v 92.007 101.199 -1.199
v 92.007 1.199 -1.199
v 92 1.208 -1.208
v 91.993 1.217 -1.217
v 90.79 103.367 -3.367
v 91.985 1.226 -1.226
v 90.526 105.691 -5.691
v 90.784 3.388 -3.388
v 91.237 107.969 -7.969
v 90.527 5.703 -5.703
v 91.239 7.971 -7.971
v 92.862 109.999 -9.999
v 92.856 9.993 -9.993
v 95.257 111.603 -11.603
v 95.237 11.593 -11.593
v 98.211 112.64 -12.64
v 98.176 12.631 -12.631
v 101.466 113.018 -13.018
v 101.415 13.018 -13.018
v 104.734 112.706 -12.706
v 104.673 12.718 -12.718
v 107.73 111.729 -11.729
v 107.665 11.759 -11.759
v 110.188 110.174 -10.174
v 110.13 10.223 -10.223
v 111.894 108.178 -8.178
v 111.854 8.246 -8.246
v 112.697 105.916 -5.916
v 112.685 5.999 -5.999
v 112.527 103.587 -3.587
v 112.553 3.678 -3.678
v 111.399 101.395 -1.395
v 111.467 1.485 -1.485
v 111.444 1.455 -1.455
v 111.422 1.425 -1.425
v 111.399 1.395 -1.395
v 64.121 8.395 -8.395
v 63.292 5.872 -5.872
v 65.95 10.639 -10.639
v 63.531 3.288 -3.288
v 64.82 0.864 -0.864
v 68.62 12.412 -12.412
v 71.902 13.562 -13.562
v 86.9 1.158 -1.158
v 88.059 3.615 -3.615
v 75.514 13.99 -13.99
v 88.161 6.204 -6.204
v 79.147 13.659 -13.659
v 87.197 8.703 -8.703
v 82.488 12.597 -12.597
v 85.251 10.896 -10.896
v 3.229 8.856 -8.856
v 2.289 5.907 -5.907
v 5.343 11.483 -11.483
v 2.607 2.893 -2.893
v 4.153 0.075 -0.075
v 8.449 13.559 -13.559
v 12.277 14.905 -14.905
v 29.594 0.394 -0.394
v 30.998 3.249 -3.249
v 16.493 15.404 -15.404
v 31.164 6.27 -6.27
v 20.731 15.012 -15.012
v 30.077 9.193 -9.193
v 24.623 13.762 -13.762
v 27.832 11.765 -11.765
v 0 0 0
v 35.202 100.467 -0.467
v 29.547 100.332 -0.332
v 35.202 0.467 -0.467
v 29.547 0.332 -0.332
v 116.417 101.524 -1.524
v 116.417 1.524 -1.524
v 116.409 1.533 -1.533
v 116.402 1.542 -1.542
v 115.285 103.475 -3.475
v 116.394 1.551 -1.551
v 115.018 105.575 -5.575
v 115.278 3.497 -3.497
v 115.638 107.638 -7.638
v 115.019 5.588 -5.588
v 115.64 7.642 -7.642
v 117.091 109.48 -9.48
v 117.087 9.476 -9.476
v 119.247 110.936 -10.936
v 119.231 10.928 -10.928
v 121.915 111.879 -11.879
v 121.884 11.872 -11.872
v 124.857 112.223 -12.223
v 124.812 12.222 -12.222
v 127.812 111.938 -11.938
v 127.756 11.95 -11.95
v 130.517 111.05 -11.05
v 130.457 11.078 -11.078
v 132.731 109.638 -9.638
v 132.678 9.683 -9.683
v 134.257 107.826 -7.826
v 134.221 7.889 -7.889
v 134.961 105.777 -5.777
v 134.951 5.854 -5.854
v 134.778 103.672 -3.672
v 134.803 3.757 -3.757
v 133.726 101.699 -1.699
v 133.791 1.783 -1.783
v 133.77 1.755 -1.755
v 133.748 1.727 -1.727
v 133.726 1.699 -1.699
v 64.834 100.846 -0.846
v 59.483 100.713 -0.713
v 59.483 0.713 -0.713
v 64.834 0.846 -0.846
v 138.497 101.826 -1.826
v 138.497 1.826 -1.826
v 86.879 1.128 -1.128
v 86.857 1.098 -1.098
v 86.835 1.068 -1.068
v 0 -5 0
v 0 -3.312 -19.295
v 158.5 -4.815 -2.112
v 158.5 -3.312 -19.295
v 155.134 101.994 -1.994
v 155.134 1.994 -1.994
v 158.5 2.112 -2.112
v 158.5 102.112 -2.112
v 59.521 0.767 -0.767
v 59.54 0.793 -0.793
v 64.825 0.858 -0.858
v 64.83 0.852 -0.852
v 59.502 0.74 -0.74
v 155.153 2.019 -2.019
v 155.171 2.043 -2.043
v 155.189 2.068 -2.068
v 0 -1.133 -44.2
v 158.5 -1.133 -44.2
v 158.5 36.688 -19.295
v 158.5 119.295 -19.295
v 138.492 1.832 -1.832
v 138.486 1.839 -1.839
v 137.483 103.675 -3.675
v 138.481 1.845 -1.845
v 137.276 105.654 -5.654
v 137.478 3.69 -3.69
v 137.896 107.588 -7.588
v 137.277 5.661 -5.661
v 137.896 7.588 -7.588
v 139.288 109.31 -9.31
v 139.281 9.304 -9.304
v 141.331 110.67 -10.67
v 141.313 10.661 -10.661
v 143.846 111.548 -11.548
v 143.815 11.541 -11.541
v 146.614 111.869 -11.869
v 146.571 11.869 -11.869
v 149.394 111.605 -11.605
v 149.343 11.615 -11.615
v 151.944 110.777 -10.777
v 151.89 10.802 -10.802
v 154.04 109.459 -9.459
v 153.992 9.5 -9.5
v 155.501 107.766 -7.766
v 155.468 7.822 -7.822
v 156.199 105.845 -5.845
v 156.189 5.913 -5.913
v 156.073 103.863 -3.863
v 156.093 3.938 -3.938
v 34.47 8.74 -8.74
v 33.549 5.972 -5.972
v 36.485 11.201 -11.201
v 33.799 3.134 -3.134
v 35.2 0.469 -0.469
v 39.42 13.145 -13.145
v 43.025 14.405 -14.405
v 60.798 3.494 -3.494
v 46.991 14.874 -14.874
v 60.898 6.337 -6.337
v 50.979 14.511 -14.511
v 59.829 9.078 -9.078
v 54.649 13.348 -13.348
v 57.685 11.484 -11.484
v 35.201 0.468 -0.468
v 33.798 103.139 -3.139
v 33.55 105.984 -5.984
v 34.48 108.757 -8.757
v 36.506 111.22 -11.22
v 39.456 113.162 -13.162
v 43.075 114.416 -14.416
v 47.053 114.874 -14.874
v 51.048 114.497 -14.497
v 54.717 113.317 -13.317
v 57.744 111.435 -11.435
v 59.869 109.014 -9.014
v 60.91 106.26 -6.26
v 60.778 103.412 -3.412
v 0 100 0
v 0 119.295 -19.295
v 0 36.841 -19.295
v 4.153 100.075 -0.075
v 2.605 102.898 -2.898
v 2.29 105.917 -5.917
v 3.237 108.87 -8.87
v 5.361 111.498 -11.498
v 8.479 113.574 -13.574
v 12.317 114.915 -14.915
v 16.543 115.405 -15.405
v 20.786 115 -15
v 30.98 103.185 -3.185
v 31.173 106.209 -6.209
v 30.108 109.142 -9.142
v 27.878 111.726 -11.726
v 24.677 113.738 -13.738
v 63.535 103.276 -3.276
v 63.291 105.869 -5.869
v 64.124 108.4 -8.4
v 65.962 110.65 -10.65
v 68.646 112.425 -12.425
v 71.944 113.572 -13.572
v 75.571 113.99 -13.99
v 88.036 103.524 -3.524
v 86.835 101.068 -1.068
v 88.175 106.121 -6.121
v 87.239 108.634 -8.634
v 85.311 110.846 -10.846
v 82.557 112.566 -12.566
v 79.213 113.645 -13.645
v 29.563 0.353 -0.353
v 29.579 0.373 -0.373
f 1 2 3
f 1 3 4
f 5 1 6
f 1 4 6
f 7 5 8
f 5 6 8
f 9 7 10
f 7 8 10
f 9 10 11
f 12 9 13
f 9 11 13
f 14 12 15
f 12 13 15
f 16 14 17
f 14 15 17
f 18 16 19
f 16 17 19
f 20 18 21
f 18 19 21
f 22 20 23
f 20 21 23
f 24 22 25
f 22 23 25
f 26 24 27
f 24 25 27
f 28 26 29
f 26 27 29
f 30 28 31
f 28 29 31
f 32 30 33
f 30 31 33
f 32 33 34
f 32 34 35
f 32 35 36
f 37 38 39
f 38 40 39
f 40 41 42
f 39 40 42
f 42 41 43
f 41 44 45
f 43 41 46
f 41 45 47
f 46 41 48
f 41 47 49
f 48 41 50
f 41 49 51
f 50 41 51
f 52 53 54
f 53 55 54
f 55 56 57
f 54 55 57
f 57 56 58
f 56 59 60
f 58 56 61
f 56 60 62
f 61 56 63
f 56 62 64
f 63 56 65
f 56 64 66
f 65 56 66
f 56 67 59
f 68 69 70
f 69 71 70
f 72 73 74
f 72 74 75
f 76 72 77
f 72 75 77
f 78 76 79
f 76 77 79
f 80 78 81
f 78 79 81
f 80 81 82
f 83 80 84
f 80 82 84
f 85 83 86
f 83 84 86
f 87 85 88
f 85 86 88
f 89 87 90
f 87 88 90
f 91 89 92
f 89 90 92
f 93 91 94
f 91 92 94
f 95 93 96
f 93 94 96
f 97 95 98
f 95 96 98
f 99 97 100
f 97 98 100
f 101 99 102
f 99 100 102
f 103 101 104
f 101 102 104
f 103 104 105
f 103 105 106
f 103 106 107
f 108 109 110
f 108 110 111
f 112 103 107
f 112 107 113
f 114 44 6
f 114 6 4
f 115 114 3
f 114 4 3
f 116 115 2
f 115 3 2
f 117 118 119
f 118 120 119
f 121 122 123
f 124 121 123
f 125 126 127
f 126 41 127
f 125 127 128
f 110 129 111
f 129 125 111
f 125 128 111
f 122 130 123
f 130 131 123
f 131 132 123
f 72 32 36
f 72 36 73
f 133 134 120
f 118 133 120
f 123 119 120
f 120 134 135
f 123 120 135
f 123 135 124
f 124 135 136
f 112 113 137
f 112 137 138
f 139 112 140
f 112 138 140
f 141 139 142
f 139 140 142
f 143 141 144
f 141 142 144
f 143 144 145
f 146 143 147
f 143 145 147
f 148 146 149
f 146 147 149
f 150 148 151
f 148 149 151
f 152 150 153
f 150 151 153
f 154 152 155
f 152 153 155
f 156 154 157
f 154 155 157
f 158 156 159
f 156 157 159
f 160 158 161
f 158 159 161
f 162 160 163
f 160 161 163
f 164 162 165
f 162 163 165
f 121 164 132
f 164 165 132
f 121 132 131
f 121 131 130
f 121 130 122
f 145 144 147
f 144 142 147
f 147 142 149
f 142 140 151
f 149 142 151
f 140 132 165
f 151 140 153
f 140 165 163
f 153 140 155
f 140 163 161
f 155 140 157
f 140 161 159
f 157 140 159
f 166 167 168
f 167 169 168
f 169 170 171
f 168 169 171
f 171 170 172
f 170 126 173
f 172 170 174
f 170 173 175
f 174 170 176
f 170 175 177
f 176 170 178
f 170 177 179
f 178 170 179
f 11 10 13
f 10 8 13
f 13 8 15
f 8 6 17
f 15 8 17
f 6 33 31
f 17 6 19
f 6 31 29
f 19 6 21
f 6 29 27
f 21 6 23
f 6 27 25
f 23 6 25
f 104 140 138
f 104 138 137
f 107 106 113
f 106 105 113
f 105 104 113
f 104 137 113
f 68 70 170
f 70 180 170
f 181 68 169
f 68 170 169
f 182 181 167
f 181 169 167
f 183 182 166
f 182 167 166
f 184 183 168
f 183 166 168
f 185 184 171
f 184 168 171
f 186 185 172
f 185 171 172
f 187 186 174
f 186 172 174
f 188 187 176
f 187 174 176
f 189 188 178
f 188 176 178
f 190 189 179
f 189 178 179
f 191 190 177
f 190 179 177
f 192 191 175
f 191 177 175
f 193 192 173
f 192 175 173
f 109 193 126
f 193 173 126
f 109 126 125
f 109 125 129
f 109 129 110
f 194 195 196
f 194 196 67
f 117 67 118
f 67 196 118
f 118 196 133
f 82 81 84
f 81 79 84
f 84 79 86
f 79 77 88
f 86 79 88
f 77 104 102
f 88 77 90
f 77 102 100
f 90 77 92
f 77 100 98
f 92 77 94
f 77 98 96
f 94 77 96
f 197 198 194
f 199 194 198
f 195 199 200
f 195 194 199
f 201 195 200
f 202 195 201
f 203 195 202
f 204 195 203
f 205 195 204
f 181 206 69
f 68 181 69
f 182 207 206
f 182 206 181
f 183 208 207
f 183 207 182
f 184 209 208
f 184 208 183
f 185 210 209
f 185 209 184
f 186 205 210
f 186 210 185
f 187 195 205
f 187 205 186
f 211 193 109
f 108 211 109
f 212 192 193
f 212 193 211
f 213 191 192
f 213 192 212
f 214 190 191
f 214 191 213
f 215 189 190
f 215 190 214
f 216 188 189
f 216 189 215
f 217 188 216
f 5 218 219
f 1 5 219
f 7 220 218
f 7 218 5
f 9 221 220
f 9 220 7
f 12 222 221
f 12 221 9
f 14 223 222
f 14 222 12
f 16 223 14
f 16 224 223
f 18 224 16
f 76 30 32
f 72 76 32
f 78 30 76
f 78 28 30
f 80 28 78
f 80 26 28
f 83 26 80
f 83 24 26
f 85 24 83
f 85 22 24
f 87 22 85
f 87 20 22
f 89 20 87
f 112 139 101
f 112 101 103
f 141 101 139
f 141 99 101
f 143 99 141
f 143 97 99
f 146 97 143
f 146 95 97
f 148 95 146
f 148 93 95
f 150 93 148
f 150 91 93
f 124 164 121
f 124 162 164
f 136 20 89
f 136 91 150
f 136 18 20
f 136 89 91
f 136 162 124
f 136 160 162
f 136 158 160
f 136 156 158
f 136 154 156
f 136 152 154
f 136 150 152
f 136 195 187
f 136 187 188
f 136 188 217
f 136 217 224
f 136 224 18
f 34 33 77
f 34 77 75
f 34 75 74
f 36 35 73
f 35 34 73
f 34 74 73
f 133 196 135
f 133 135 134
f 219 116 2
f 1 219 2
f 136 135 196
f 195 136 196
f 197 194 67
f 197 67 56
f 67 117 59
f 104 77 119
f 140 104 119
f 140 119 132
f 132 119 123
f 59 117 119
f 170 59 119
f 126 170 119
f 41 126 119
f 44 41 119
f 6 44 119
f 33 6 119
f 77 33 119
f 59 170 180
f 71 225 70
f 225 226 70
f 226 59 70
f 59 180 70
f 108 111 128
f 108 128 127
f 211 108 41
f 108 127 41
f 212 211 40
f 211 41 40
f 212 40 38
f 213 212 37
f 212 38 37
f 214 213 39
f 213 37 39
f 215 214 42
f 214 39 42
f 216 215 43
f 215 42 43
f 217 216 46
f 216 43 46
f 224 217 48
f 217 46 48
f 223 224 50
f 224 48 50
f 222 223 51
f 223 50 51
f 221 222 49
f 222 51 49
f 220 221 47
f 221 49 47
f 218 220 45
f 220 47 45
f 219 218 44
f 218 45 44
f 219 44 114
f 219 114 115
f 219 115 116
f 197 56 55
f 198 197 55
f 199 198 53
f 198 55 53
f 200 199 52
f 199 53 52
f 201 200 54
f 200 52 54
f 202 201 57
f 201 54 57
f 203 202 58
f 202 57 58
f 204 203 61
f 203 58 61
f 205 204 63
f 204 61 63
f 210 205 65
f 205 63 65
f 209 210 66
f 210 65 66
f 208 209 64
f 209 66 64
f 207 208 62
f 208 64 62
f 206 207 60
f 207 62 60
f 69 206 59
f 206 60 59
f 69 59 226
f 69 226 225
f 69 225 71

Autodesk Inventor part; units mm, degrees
ref_plane "YZ Plane" through (0, 0, 0) normal (1, 0, 0) x (0, 1, 0)
ref_plane "XZ Plane" through (0, 0, 0) normal (0, 1, 0) x (-1, 0, 0)
sketch "Sketch1" plane through (0, 0, 0) normal (0, 0, 1) x (1, 0, 0)
  arc A0 (12.7973, -6.8176) -> (-12.597, -7.1809) centre (0, 0) ccw
  arc A1 (50.4829, -6.2785) -> (26.2017, -6.6259) centre (38.25, 0) ccw
  arc A2 (85.5853, -5.7763) -> (63.5844, -6.091) centre (74.5, 0) ccw
  arc A3 (117.8988, -5.314) -> (98.5072, -5.5914) centre (108.125, 0) ccw
  arc A4 (147.9764, -4.8837) -> (130.6669, -5.1313) centre (139.25, 0) ccw
  arc A5 (177.1345, -4.4665) -> (160.4967, -4.7045) centre (168.75, 0) ccw
  line L0 (-20, 20) -> (188.75, 20)
  line L1 (188.75, 20) -> (188.75, -4.3003)
  line L2 (-20, 20) -> (-20, -7.2868)
  line L3 (-20, -7.2868) -> (188.75, -4.3003)
  dimension "d0" = 29
  dimension "d1" = 27.5
  dimension "d2" = 25
  dimension "d3" = 22.25
  dimension "d4" = 20
  dimension "d5" = 19
  dimension "d6" = 38.25
  dimension "d7" = 36.25
  dimension "d8" = 33.625
  dimension "d9" = 31.125
  dimension "d10" = 29.5
  dimension "d11" = 0
  dimension "d12" = 0
  dimension "d13" = 0
  dimension "d14" = 0
  dimension "d15" = 0
  dimension "d20" = 20
  dimension "d22" = 20
  dimension "d23" = 20
  dimension "d24" = 7
  dimension "d25" = 4.586
sketch "Sketch4" plane through (0, 0, 0) normal (1, 0, 0) x (0, 1, 0)
  line L0 (0, 0) -> (29.9033, -29.9033)
  line L1 (0, 5.9807) -> (0, -35.884) projected
  point P0 (100, 0)
  dimension "d51" = 45
  dimension "d53" = 0
  dimension "d55" = 29.9033
  dimension "d98" = 100
ref_plane "Work Plane4" through (0, 100, 0) normal (0, 0.7071068, 0.7071068) x (1, 0, 0)
ref_plane "Work Plane3" through (-10, 0, 0) normal (0, 0.7071068, 0.7071068) x (1, 0, 0)
sketch "Sketch5" plane through (-10, 0, 0) normal (0, 0.7071068, 0.7071068) x (1, 0, 0)
  arc A0 (39.5473, 0.4692) -> (14.153, 0.1059) centre (26.75, 7.2868) ccw
  arc A1 (69.4829, 1.0084) -> (45.2017, 0.661) centre (57.25, 7.2868) ccw
  arc A2 (96.8353, 1.5106) -> (74.8344, 1.1958) centre (85.75, 7.2868) ccw
  arc A3 (121.3988, 1.9729) -> (102.0072, 1.6954) centre (111.625, 7.2868) ccw
  arc A4 (143.7264, 2.4032) -> (126.4169, 2.1555) centre (135, 7.2868) ccw
  arc A5 (165.1345, 2.8203) -> (148.4967, 2.5823) centre (156.75, 7.2868) ccw
  line L0 (10, 27.2868) -> (168.5, 27.2868)
  line L1 (168.5, 27.2868) -> (168.5, 2.9865)
  line L2 (10, 27.2868) -> (10, 0)
  line L3 (10, 0) -> (14.153, 0.1059)
  line L4 (39.5473, 0.4692) -> (45.2017, 0.661)
  line L5 (69.4829, 1.0084) -> (74.8344, 1.1958)
  line L6 (96.8353, 1.5106) -> (102.0072, 1.6954)
  line L7 (165.1345, 2.8203) -> (168.5, 2.9865)
  line L8 (121.3988, 1.9729) -> (126.4169, 2.1555)
  line L9 (143.7264, 2.4032) -> (148.4967, 2.5823)
  dimension "d56" = 29
  dimension "d57" = 27.5
  dimension "d58" = 25
  dimension "d59" = 22.25
  dimension "d60" = 20
  dimension "d61" = 19
  dimension "d62" = 30.5
  dimension "d63" = 28.5
  dimension "d64" = 25.875
  dimension "d65" = 23.375
  dimension "d66" = 21.75
  dimension "d67" = 0
  dimension "d68" = 0
  dimension "d69" = 0
  dimension "d70" = 0
  dimension "d71" = 0
  dimension "d72" = 20
  dimension "d73" = 11.75
  dimension "d74" = 16.75
sketch "Sketch6" plane through (0, 100, 0) normal (0, 0.7071068, 0.7071068) x (1, 0, 0)
  arc A0 (29.5473, 0.4692) -> (4.153, 0.1059) centre (16.75, 7.2868) ccw
  arc A1 (59.4829, 1.0084) -> (35.2017, 0.661) centre (47.25, 7.2868) ccw
  arc A2 (86.8353, 1.5106) -> (64.8344, 1.1958) centre (75.75, 7.2868) ccw
  arc A3 (111.3988, 1.9729) -> (92.0072, 1.6954) centre (101.625, 7.2868) ccw
  arc A4 (133.7264, 2.4032) -> (116.4169, 2.1555) centre (125, 7.2868) ccw
  arc A5 (155.1345, 2.8203) -> (138.4967, 2.5823) centre (146.75, 7.2868) ccw
  line L0 (0, 27.2868) -> (158.5, 27.2868)
  line L1 (158.5, 27.2868) -> (158.5, 2.9865)
  line L2 (0, 27.2868) -> (0, 0)
  line L3 (0, 0) -> (4.153, 0.1059)
  line L4 (29.5473, 0.4692) -> (35.2017, 0.661)
  line L5 (59.4829, 1.0084) -> (64.8344, 1.1958)
  line L6 (86.8353, 1.5106) -> (92.0072, 1.6954)
  line L7 (111.3988, 1.9729) -> (116.4169, 2.1555)
  line L8 (133.7264, 2.4032) -> (138.4967, 2.5823)
  line L9 (155.1345, 2.8203) -> (158.5, 2.9865)
  point P0 (0, -70.7107)
  dimension "d77" = 29
  dimension "d78" = 27.5
  dimension "d79" = 25
  dimension "d80" = 22.25
  dimension "d81" = 20
  dimension "d82" = 19
  dimension "d83" = 30.5
  dimension "d84" = 28.5
  dimension "d85" = 25.875
  dimension "d86" = 23.375
  dimension "d87" = 21.75
  dimension "d88" = 0
  dimension "d89" = 0
  dimension "d90" = 0
  dimension "d91" = 0
  dimension "d92" = 0
  dimension "d93" = 20
  dimension "d94" = 11.75
  dimension "d95" = 16.75
loft "Loft1" add profiles "Sketch6", "Sketch5"
sketch "Sketch7" plane through (0, 0, 0) normal (0, 1, 0) x (-1, 0, 0)
  line L0 (0, 0) -> (0, -19.2947) projected
  line L1 (0, -19.2947) -> (-158.5, -19.2947) projected
  line L2 (-158.5, -19.2947) -> (-158.5, -2.1118) projected
  line L3 (-158.5, -2.1118) -> (-155.1345, -1.9943) projected
  ellipse E0 centre (-146.75, -5.1526) end of major axis (-156.25, -5.1526) minor radius 6.7175 (-155.1345, -1.9943) -> (-138.4967, -1.826) ccw projected
  line L4 (-138.4967, -1.826) -> (-133.7264, -1.6993) projected
  ellipse E1 centre (-125, -5.1526) end of major axis (-135, -5.1526) minor radius 7.0711 (-133.7264, -1.6993) -> (-116.4169, -1.5242) ccw projected
  line L5 (-116.4169, -1.5242) -> (-111.3988, -1.395) projected
  ellipse E2 centre (-101.625, -5.1526) end of major axis (-112.75, -5.1526) minor radius 7.8666 (-111.3988, -1.395) -> (-92.0072, -1.1989) ccw projected
  line L6 (-92.0072, -1.1989) -> (-86.8353, -1.0681) projected
  ellipse E3 centre (-75.75, -5.1526) end of major axis (-88.25, -5.1526) minor radius 8.8388 (-86.8353, -1.0681) -> (-64.8344, -0.8456) ccw projected
  line L7 (-64.8344, -0.8456) -> (-59.4829, -0.713) projected
  ellipse E4 centre (-47.25, -5.1526) end of major axis (-61, -5.1526) minor radius 9.7227 (-59.4829, -0.713) -> (-35.2017, -0.4674) ccw projected
  line L8 (-35.2017, -0.4674) -> (-29.5473, -0.3318) projected
  ellipse E5 centre (-16.75, -5.1526) end of major axis (-31.25, -5.1526) minor radius 10.253 (-29.5473, -0.3318) -> (-4.153, -0.0749) ccw projected
  line L9 (-4.153, -0.0749) -> (0, 0) projected
  line L10 (0, 0) -> (0, -19.2947)
  line L11 (0, -19.2947) -> (-158.5, -19.2947)
  line L12 (-158.5, -19.2947) -> (-158.5, -2.1118)
  line L13 (-158.5, -2.1118) -> (0, 0)
  point P0 (0, 0)
sketch "Sketch10" plane through (0, 19.2947, -19.2947) normal (-1, 0, 0) x (0, 0, 1)
  line L0 (19.2947, 80.7053) -> (0, 100) projected
  line L1 (0, 100) -> (0, 0) projected
  line L2 (19.2947, -19.2947) -> (0, 0) projected
  line L3 (19.2947, 80.7053) -> (19.2947, -19.2947) projected
  line L4 (19.2947, -19.2947) -> (19.2947, -24.2947)
  line L5 (0, 0) -> (0, -22.6066)
  line L6 (0, -22.6066) -> (19.2947, -24.2947)
  line L7 (0, -22.6066) -> (-24.9049, -20.4278)
  line L8 (-24.9049, -20.4278) -> (0, 17.5461)
  line L9 (0, 100) -> (0, 0) projected
  line L10 (0, 17.5461) -> (0, 0)
  point P0 (19.2947, -19.2947)
  dimension "d106" = 5
  dimension "d111" = 85
  dimension "d113" = 25
  dimension "d114" = 40
sketch "Sketch11" plane through (158.5, 2.1118, -2.1118) normal (1, 0, 0) x (0, 0, -1)
  line L0 (17.1829, 117.1829) -> (0, 100) projected
  line L1 (0, 100) -> (0, 0) projected
  line L2 (17.1829, 17.1829) -> (0, 0) projected
  line L3 (17.1829, 117.1829) -> (17.1829, 17.1829) projected
  line L4 (17.1829, 17.1829) -> (0, 0)
  line L5 (10.1119, 10.1119) -> (-0.5876, -0.5876) projected
  line L6 (17.1829, -5.4237) -> (-2.1118, -7.1118) projected
  line L7 (0, 0) -> (0, -6.927)
  line L8 (17.1829, -5.4237) -> (0, -6.927)
  line L9 (17.1829, -5.4237) -> (17.1829, 17.1829)
  line L10 (0, -6.927) -> (17.1829, -5.4237)
  line L11 (17.1829, -5.4237) -> (42.0878, -3.2448)
  line L12 (42.0878, -3.2448) -> (17.1829, 34.5763)
  line L13 (17.1829, 117.1829) -> (17.1829, 17.1829) projected
  line L14 (17.1829, 17.1829) -> (17.1829, 34.5763)
  point P0 (-2.1118, -2.1118)
  point P1 (17.1829, -7.1118)
  point P2 (-0.4125, -0.4125)
  dimension "d115" = 25
  dimension "d116" = 40
loft "Loft3" add profiles "Sketch10", "Sketch11" contours L4 L6 L5 L2 | L1 L5 L7 L8 / L12 L11 L9 L3 | L2 L9 L6 L7
properties part number "coin_holder"
